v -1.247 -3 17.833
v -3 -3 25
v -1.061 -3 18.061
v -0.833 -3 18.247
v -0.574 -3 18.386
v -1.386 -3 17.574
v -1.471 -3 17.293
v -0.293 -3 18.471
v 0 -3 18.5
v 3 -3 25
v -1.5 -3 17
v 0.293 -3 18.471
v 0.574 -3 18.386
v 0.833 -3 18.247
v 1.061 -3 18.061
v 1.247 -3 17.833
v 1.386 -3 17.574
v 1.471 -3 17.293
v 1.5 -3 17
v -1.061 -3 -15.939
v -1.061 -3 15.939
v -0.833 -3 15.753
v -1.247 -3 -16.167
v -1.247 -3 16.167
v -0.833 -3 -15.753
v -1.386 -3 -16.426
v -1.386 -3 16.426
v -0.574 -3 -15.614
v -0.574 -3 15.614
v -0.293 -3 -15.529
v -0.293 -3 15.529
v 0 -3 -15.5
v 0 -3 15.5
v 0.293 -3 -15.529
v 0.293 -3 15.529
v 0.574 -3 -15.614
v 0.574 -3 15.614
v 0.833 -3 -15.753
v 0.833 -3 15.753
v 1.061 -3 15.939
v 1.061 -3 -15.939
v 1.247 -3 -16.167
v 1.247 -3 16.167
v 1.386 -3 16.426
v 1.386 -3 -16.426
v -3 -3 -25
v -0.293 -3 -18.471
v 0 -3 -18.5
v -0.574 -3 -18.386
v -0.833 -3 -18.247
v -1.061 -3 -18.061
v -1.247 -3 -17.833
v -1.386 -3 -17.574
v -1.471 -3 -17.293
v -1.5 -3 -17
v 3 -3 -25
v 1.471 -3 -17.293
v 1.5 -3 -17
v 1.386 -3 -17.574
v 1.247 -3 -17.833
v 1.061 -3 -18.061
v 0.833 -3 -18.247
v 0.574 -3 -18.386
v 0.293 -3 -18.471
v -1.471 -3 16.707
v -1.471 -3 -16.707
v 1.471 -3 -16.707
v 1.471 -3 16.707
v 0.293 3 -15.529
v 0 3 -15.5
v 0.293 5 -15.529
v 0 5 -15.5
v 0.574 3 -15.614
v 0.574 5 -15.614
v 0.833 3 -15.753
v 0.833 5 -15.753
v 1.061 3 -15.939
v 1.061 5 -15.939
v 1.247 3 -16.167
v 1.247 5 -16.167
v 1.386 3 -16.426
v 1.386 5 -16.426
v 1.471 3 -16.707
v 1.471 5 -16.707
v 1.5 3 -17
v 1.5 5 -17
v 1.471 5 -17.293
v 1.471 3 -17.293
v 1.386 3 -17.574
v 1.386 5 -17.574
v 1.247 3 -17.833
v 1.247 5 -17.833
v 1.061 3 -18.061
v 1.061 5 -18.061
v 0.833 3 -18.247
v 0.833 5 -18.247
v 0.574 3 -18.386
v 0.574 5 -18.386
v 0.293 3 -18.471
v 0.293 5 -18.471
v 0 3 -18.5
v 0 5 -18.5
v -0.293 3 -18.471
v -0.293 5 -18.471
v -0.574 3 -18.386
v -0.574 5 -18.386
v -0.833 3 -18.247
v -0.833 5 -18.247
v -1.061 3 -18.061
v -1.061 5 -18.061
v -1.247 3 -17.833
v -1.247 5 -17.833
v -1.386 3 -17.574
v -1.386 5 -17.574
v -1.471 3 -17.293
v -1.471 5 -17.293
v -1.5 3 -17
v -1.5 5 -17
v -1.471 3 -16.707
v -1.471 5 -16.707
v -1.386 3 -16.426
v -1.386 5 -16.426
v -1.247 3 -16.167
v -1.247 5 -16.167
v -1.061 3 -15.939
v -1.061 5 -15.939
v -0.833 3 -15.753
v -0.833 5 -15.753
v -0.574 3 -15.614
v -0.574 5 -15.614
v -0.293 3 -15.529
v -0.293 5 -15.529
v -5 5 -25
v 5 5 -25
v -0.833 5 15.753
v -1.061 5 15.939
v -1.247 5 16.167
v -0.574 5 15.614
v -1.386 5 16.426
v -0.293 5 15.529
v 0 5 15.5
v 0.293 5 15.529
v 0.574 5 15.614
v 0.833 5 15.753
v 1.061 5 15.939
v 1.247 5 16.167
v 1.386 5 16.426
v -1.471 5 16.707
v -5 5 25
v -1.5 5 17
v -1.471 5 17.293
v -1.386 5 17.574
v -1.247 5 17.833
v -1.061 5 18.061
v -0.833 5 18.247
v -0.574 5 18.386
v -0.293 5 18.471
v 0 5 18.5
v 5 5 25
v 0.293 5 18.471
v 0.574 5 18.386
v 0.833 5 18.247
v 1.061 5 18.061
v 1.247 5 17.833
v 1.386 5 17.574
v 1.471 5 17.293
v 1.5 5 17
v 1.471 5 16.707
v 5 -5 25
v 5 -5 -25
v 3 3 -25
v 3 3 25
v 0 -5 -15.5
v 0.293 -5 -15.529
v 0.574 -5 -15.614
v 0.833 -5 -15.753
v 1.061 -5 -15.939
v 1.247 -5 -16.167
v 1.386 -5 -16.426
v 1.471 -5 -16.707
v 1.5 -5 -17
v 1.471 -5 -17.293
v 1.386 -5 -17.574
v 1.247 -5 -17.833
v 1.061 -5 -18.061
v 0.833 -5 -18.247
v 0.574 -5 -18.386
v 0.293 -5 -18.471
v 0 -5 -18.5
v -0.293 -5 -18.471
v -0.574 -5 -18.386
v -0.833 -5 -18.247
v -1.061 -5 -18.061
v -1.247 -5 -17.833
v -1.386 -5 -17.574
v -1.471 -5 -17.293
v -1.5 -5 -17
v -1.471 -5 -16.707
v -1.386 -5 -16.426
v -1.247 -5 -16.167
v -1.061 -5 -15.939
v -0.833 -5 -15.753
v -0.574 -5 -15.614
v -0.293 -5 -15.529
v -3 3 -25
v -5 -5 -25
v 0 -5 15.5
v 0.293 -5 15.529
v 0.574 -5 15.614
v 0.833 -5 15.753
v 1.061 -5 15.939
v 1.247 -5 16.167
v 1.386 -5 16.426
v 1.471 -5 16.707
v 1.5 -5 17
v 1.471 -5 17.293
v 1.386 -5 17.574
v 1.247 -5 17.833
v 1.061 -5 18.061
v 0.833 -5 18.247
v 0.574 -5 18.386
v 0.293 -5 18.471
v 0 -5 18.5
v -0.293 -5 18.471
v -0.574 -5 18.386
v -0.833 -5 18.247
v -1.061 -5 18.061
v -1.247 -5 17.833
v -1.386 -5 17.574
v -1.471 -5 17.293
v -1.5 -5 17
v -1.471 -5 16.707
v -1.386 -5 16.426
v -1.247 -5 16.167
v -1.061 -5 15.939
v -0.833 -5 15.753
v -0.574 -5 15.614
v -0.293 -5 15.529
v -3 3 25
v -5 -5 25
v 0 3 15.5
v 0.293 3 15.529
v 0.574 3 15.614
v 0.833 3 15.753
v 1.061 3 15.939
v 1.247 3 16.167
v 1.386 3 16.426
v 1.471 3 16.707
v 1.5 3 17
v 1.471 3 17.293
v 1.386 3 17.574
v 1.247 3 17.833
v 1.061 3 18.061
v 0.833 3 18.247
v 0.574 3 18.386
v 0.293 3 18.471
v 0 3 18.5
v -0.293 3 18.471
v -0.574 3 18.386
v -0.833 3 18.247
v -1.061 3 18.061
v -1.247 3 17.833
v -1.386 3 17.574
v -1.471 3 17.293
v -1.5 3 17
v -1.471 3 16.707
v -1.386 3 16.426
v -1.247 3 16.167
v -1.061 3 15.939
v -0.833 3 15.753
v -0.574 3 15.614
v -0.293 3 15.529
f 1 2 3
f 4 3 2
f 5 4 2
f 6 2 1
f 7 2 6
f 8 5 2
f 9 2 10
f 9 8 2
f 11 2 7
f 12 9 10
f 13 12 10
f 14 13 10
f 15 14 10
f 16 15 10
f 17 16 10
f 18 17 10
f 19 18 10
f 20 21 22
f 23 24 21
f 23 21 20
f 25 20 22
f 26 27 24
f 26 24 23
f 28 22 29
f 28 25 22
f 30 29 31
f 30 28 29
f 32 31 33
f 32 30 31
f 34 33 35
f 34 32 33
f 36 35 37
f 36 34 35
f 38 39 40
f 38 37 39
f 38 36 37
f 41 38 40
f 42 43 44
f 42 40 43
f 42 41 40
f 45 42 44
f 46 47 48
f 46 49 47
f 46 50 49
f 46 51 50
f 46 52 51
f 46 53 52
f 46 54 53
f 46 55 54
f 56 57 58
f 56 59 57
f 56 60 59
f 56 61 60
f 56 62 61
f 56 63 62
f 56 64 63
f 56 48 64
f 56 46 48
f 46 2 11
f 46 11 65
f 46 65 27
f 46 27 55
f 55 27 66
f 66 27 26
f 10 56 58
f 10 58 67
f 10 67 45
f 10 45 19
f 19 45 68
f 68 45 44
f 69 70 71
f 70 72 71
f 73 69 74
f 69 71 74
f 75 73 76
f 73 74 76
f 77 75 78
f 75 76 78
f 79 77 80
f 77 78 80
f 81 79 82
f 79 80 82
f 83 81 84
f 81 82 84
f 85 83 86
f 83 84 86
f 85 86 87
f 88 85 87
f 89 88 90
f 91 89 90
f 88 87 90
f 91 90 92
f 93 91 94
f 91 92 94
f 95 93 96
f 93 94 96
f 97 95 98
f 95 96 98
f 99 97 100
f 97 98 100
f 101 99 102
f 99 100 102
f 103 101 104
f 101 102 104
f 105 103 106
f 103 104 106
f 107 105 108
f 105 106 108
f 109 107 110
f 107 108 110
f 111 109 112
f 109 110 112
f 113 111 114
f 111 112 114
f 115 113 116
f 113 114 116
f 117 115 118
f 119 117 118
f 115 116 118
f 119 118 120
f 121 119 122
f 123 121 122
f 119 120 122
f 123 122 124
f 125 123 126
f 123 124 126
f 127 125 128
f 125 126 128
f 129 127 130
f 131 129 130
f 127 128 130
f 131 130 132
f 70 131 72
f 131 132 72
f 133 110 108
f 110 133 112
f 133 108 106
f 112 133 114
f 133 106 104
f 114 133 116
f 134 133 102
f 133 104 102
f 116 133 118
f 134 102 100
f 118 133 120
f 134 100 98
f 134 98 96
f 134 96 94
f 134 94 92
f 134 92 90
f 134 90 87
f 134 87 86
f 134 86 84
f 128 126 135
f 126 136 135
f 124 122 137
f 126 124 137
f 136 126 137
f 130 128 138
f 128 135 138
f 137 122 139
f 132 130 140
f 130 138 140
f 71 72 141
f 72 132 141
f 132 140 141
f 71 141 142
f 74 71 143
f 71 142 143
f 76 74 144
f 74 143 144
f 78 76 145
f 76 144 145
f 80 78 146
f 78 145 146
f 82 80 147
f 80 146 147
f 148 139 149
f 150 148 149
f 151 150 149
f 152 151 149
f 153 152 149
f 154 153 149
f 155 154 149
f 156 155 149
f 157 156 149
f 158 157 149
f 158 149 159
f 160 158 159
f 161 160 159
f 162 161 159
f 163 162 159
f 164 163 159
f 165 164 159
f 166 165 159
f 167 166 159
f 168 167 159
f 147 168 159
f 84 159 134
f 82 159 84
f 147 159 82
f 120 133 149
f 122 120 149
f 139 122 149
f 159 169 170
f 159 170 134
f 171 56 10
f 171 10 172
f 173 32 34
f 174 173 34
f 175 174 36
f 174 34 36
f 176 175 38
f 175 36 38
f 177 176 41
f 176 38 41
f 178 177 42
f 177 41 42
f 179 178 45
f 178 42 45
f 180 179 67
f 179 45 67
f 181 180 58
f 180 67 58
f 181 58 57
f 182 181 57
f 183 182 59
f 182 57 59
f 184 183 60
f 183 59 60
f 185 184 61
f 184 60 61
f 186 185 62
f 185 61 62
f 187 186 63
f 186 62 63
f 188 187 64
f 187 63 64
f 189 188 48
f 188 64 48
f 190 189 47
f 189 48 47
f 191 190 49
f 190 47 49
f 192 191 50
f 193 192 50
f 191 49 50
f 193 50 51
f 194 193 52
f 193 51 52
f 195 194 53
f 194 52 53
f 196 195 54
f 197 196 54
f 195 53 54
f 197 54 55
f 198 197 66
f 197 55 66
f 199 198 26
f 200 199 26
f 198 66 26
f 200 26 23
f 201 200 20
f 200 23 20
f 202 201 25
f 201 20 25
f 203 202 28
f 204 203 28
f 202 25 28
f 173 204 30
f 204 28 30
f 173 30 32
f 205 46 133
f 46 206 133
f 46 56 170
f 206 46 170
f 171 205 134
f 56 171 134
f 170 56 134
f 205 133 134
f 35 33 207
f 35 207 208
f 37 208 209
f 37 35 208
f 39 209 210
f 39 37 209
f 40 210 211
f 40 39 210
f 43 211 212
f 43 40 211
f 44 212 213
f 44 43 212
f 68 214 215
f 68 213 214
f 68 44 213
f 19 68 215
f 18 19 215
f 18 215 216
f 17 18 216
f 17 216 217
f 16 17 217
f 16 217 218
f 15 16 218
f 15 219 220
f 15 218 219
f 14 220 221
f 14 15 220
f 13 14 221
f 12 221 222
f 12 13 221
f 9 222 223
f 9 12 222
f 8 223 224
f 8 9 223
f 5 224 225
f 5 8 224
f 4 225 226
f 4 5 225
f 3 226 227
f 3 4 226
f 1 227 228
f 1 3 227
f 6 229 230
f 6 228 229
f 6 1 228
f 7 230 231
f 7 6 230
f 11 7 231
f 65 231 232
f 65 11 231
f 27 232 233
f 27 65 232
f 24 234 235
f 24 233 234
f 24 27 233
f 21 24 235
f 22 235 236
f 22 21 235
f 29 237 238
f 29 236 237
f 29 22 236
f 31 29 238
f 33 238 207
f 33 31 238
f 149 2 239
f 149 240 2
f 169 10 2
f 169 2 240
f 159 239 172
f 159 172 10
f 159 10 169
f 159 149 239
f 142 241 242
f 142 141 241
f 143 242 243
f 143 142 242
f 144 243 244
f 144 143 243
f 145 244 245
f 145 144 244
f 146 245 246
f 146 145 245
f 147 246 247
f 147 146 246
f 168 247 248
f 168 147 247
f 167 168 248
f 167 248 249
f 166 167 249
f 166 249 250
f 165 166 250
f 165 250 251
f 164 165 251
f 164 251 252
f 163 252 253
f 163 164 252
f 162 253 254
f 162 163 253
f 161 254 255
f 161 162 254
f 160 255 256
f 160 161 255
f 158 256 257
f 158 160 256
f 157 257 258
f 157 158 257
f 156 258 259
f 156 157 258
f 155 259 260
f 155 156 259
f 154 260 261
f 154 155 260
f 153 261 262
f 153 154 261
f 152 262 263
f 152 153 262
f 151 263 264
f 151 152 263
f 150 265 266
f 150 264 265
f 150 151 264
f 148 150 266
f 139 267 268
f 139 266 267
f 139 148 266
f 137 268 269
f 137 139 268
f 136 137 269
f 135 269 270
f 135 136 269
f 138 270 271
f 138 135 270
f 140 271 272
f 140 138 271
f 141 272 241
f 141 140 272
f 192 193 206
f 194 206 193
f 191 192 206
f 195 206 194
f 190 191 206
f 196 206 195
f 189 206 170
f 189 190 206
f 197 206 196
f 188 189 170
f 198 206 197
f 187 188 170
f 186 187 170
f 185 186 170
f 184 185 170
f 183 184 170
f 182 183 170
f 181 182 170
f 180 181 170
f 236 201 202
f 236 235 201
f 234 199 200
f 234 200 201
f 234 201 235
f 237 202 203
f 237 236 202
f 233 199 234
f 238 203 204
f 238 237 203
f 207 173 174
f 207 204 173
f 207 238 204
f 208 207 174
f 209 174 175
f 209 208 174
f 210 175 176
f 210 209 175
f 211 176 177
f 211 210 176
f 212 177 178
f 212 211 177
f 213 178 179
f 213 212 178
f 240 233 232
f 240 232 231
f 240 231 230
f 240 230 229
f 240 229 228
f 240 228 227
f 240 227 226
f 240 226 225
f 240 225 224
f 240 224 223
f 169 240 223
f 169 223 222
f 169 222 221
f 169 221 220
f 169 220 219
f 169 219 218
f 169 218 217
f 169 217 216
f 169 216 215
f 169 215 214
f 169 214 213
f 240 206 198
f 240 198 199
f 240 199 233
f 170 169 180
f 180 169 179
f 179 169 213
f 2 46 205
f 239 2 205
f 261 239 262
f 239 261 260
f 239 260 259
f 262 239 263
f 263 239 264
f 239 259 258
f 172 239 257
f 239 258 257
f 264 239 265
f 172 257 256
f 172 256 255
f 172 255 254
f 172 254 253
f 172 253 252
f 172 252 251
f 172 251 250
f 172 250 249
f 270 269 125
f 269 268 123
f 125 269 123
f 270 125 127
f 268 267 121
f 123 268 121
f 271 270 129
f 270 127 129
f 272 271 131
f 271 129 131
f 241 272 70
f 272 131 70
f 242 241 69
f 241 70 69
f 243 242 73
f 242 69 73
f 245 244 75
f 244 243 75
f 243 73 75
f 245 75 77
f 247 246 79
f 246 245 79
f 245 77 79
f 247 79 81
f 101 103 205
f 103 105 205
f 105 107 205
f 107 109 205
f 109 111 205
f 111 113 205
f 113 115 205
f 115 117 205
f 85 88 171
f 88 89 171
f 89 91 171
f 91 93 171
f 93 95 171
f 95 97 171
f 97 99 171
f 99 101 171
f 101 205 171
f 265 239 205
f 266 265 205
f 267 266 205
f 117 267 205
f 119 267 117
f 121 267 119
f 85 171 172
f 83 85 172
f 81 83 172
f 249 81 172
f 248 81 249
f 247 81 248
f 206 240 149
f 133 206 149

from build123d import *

# Parameters (mm, degrees)
SKETCH_2_W               = 10
SKETCH_2_H               = 10
EXTRUDE_1_DEPTH          = 25
SKETCH_3_R               = 1.5
CUT_EXTRUDE_1_DEPTH      = 28.386127875
CUT_EXTRUDE_2_DEPTH      = 51.497524692
CUT_EXTRUDE_2_DEPTH_BACK = 51.497524692
SKETCH_4_W               = 6
SKETCH_4_H               = 6


with BuildPart() as part:
    # 草图2 → 凸台-拉伸1 (new, symmetric)
    with BuildSketch(Plane.XY):
        Rectangle(SKETCH_2_W, SKETCH_2_H)
    extrude(amount=EXTRUDE_1_DEPTH, both=True)

    # 草图3 → 切除-拉伸1 (cut, symmetric)
    with BuildSketch(Plane(origin=(0, 5, 0), x_dir=(1, 0, 0), z_dir=(0, 1, 0))):
        with Locations(Location((0, 17, 0), (0, 0, 270))):
            Circle(SKETCH_3_R)
    cut_extrude_1 = extrude(amount=CUT_EXTRUDE_1_DEPTH, both=True, mode=Mode.SUBTRACT)

    # 镜向1: 切除-拉伸1 across plane
    add(cut_extrude_1.mirror(Plane.XY), mode=Mode.SUBTRACT)

    # 草图4 → 切除-拉伸2 (cut, two sides: drawn at the far end of the back side and taken through both)
    with BuildSketch(Plane.XY.offset(25).offset(-CUT_EXTRUDE_2_DEPTH_BACK)):
        Rectangle(SKETCH_4_W, SKETCH_4_H)
    extrude(amount=CUT_EXTRUDE_2_DEPTH + CUT_EXTRUDE_2_DEPTH_BACK, mode=Mode.SUBTRACT)


solid = part.part
